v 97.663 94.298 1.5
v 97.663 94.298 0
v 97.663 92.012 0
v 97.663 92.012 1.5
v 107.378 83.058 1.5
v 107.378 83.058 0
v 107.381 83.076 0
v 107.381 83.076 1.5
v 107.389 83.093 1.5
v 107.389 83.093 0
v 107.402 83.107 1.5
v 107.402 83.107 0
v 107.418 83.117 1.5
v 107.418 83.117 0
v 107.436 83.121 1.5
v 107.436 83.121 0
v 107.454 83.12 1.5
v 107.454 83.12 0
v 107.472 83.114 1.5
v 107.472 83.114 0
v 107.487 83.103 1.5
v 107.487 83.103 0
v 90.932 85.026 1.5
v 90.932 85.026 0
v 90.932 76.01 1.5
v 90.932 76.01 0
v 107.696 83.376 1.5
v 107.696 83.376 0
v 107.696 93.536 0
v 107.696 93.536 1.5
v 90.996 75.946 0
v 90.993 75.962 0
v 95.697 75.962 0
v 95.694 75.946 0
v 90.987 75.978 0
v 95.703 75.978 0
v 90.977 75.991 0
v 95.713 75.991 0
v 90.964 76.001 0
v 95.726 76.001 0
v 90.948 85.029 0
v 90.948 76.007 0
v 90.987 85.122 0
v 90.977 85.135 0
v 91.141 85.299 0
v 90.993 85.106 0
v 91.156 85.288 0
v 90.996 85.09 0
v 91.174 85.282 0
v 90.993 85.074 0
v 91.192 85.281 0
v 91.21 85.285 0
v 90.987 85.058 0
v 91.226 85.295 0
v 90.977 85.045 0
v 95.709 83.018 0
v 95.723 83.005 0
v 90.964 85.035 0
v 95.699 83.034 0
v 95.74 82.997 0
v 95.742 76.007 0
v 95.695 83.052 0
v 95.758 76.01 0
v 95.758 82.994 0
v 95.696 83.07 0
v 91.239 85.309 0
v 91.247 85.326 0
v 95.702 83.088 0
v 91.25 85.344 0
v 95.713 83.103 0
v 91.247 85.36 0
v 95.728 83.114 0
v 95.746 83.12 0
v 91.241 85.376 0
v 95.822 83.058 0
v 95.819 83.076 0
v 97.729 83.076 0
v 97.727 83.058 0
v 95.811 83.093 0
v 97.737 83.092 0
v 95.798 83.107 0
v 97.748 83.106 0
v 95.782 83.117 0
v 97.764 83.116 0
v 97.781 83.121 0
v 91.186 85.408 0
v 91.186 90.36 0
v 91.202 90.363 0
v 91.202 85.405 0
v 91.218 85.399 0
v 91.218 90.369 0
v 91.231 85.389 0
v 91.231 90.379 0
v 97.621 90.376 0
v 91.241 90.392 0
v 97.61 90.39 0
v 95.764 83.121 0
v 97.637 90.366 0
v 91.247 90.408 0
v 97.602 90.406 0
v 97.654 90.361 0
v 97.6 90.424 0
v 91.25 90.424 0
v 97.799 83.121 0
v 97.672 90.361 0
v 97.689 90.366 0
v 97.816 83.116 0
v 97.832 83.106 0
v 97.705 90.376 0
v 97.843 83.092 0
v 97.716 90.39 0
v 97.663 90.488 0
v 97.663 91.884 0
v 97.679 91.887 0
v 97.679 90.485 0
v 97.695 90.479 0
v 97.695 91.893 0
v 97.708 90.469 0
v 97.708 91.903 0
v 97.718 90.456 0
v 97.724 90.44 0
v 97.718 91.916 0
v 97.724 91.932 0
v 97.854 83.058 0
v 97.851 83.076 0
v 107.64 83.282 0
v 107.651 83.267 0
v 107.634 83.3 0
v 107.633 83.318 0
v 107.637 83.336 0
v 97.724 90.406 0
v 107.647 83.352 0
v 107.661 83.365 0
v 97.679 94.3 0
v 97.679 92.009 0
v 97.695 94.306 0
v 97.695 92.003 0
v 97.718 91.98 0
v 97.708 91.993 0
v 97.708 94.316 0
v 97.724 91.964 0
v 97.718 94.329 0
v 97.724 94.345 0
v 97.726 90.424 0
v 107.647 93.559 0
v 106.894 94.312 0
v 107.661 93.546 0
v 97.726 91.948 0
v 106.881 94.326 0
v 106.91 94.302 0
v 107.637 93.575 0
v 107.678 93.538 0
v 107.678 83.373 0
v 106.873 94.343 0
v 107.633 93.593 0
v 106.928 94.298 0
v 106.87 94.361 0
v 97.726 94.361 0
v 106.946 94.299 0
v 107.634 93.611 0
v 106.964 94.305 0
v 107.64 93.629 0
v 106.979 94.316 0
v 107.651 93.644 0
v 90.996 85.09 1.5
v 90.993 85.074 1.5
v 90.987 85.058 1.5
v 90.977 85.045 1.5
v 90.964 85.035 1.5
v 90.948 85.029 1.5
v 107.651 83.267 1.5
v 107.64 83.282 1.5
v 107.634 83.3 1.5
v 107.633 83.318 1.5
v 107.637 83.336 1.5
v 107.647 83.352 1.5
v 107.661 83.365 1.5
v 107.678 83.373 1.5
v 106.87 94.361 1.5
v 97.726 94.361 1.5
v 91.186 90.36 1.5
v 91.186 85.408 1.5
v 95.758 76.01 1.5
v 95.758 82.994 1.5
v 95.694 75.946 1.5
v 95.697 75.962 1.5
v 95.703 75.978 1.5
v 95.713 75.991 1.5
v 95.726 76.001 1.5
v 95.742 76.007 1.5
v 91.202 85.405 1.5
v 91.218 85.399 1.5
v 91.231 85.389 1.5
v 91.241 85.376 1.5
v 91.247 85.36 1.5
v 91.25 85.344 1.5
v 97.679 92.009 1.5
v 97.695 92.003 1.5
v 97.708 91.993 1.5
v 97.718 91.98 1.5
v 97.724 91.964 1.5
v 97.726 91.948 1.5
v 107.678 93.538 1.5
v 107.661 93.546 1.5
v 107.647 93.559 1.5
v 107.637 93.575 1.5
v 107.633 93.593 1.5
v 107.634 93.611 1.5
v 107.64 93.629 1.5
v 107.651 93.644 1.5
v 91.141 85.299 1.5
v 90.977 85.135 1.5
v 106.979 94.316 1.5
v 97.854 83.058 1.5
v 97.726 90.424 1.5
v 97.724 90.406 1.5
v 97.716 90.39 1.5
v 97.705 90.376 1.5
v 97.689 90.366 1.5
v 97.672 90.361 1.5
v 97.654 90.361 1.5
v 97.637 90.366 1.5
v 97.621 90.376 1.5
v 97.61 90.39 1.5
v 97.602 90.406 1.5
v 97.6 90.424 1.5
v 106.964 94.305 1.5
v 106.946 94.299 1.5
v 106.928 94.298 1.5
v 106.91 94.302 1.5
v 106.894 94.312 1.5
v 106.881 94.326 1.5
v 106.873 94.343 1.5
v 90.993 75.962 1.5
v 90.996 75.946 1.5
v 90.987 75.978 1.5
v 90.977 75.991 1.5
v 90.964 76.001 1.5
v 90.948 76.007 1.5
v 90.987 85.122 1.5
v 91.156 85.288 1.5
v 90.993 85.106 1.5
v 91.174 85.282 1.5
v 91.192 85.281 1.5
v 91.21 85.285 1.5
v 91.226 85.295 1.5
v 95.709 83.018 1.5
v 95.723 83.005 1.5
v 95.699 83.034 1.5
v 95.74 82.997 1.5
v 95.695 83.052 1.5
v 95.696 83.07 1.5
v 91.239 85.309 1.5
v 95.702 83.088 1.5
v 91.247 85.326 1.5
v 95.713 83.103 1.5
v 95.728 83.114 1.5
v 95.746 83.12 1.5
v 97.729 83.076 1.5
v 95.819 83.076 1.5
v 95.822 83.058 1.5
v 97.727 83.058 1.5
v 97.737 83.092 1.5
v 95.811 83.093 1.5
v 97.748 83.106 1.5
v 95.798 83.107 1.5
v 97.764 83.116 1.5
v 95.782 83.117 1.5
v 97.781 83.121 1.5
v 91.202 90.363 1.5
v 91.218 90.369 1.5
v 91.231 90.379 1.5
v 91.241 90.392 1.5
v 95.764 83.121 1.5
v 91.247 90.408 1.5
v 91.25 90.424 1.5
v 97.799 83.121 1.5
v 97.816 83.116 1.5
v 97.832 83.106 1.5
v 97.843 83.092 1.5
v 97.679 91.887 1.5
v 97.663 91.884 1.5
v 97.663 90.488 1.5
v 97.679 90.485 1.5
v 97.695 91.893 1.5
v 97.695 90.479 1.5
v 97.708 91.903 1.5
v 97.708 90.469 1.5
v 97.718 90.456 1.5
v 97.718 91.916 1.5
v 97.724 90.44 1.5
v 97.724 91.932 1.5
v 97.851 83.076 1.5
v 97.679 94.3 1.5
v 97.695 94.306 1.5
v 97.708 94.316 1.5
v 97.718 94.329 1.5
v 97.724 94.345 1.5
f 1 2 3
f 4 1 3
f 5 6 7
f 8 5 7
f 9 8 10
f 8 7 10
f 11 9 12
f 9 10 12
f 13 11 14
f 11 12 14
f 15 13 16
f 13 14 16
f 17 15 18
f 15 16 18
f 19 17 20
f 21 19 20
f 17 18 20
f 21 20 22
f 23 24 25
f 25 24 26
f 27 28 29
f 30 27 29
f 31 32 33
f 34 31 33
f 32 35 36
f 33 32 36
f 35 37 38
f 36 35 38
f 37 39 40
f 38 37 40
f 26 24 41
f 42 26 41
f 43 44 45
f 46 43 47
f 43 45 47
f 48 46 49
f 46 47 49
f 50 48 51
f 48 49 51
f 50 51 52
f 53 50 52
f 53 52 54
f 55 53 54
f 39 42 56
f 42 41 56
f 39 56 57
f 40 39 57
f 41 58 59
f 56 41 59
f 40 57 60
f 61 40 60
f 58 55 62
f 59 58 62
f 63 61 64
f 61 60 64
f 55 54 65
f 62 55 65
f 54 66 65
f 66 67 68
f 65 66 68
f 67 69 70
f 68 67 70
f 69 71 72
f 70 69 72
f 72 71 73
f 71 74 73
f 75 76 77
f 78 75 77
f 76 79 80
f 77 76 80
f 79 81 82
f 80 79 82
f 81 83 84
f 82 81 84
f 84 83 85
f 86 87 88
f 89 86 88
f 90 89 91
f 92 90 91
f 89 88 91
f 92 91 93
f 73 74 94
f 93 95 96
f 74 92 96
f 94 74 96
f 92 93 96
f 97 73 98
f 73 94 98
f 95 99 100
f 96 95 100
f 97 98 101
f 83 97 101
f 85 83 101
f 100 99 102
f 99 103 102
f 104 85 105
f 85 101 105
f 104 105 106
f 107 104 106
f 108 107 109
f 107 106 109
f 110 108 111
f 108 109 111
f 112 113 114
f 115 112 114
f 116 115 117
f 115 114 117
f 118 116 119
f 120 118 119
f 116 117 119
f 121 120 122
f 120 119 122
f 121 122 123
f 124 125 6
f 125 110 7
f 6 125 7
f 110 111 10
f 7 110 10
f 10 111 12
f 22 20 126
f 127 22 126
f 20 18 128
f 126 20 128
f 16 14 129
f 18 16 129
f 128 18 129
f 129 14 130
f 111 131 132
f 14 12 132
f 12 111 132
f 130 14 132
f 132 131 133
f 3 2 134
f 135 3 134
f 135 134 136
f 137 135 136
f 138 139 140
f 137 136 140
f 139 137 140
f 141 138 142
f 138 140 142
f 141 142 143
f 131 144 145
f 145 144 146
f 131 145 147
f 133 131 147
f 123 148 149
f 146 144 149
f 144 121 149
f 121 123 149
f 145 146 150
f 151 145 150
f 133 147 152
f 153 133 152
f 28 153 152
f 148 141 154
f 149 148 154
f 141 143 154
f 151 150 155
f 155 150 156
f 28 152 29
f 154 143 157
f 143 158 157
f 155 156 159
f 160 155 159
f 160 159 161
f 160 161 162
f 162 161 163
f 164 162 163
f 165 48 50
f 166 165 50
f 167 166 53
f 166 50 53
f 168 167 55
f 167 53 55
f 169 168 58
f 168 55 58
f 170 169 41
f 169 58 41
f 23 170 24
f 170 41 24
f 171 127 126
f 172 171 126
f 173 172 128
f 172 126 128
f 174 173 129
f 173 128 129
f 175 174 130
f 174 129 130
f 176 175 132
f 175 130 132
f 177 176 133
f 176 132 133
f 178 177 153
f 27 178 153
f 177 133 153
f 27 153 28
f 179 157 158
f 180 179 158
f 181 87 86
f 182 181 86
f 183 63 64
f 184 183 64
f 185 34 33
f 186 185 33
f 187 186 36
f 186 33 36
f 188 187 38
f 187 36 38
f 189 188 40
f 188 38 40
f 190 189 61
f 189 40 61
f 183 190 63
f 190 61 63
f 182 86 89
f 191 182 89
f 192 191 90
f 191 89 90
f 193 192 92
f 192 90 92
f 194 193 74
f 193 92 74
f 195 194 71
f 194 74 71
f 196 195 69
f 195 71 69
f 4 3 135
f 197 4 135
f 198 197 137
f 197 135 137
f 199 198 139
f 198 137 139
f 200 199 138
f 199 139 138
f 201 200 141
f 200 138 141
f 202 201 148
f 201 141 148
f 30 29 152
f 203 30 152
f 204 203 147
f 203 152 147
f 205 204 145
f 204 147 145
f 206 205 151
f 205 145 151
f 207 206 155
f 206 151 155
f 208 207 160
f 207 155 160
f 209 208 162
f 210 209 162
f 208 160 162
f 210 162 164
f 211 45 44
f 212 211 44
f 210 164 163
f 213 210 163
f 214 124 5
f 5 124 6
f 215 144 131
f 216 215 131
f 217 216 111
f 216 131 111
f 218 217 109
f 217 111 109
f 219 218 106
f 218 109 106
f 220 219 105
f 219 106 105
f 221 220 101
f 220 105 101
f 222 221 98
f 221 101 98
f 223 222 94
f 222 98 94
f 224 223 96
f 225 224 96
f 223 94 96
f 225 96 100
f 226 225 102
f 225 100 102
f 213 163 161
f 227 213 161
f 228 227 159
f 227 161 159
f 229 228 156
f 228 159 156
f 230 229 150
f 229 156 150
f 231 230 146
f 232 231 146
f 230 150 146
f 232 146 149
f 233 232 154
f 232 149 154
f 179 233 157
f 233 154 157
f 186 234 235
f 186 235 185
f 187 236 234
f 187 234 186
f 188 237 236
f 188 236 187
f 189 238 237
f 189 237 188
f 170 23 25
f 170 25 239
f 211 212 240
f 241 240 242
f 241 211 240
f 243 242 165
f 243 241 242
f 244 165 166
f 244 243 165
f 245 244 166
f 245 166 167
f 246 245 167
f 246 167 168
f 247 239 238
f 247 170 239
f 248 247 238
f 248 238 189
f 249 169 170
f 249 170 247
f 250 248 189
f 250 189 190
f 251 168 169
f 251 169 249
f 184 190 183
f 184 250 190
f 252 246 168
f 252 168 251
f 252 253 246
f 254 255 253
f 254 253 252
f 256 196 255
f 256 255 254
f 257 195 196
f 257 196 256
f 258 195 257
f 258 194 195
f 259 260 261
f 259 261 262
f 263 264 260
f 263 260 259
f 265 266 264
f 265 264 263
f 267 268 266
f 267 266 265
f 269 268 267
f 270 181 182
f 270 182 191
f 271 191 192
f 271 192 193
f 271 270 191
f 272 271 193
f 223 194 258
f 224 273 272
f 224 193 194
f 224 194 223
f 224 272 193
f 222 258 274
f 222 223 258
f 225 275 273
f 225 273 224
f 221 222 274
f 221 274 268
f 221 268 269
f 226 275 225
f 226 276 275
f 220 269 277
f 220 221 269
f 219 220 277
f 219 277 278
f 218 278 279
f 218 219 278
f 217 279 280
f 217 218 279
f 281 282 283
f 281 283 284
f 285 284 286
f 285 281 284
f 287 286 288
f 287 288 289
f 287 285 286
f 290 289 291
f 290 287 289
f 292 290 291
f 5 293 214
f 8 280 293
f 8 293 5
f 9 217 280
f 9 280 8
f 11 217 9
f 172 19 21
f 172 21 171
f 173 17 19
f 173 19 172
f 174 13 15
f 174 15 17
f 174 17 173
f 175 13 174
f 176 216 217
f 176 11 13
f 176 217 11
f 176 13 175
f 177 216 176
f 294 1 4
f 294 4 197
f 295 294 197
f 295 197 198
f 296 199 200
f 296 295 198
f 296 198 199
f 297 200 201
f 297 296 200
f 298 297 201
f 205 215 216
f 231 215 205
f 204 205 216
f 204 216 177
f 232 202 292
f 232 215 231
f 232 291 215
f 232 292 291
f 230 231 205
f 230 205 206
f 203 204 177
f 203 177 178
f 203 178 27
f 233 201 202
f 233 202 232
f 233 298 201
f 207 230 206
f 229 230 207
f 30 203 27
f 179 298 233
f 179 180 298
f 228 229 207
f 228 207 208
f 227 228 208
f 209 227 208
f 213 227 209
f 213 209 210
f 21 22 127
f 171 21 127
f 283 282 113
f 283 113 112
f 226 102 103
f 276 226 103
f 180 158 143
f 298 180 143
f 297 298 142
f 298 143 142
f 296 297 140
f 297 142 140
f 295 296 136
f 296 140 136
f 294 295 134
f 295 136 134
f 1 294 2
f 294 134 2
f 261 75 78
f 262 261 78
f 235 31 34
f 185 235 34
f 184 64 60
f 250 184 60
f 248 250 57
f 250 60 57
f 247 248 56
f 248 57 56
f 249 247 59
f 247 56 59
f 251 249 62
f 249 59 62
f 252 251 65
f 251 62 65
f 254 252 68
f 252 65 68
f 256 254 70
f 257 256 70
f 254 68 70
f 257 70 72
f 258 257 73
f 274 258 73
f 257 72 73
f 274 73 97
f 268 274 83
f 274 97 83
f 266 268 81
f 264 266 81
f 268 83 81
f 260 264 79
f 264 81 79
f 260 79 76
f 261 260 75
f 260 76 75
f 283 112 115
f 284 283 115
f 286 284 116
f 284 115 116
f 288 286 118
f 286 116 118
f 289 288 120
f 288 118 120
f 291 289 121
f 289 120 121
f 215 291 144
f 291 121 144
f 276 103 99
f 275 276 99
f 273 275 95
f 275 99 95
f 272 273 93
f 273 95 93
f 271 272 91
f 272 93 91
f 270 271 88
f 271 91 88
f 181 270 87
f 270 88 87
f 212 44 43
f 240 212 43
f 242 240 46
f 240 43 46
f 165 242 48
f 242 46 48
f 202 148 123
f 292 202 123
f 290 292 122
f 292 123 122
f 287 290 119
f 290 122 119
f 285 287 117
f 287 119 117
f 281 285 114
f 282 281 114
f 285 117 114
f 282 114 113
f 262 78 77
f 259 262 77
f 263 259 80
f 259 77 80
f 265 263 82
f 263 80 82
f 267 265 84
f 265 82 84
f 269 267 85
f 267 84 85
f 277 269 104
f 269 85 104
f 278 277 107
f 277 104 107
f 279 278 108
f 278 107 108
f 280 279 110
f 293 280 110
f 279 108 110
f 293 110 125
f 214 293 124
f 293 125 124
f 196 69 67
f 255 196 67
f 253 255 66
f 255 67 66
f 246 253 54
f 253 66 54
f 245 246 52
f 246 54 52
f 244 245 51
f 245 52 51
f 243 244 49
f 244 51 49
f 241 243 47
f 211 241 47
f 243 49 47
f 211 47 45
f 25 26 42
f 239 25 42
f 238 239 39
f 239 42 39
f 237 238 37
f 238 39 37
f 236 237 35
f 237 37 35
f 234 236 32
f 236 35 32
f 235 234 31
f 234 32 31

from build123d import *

# Parameters (mm, degrees)
EXTRUDE_1_DEPTH = 1.5


with BuildPart() as part:
    # 草图1 → 凸台-拉伸1 (new body)
    with BuildSketch(Plane.XY):
        with BuildLine():
            Line((91.141098719, 85.299098719), (90.976901281, 85.134901281))
            ThreePointArc((90.976901281, 85.134901281), (90.99066635, 85.114300398), (90.9955, 85.09))
            ThreePointArc((90.9955, 85.09), (90.976901281, 85.045098719), (90.932, 85.0265))
            Line((90.932, 85.0265), (90.932, 76.0095))
            ThreePointArc((90.932, 76.0095), (90.976901281, 75.990901281), (90.9955, 75.946))
            Line((90.9955, 75.946), (95.6945, 75.946))
            ThreePointArc((95.6945, 75.946), (95.713098719, 75.990901281), (95.758, 76.0095))
            Line((95.758, 76.0095), (95.758, 82.9945))
            ThreePointArc((95.758, 82.9945), (95.713098719, 83.102901281), (95.8215, 83.058))
            Line((95.8215, 83.058), (97.7265, 83.058))
            ThreePointArc((97.7265, 83.058), (97.79, 83.1215), (97.8535, 83.058))
            Line((97.8535, 83.058), (107.3785, 83.058))
            ThreePointArc((107.3785, 83.058), (107.417699602, 83.11666635), (107.486901281, 83.102901281))
            Line((107.486901281, 83.102901281), (107.651098719, 83.267098719))
            ThreePointArc((107.651098719, 83.267098719), (107.63733365, 83.336300398), (107.696, 83.3755))
            Line((107.696, 83.3755), (107.696, 93.5355))
            ThreePointArc((107.696, 93.5355), (107.63733365, 93.574699602), (107.651098719, 93.643901281))
            Line((107.651098719, 93.643901281), (106.978901281, 94.316098719))
            ThreePointArc((106.978901281, 94.316098719), (106.909699602, 94.30233365), (106.8705, 94.361))
            Line((106.8705, 94.361), (97.7265, 94.361))
            ThreePointArc((97.7265, 94.361), (97.707901281, 94.316098719), (97.663, 94.2975))
            Line((97.663, 94.2975), (97.663, 92.0115))
            ThreePointArc((97.663, 92.0115), (97.707901281, 91.992901281), (97.7265, 91.948))
            ThreePointArc((97.7265, 91.948), (97.707901281, 91.903098719), (97.663, 91.8845))
            Line((97.663, 91.8845), (97.663, 90.4875))
            ThreePointArc((97.663, 90.4875), (97.707901281, 90.468901281), (97.7265, 90.424))
            ThreePointArc((97.7265, 90.424), (97.663, 90.3605), (97.5995, 90.424))
            Line((97.5995, 90.424), (91.2495, 90.424))
            ThreePointArc((91.2495, 90.424), (91.230901281, 90.379098719), (91.186, 90.3605))
            Line((91.186, 90.3605), (91.186, 85.4075))
            ThreePointArc((91.186, 85.4075), (91.230901281, 85.388901281), (91.2495, 85.344))
            ThreePointArc((91.2495, 85.344), (91.210300398, 85.28533365), (91.141098719, 85.299098719))
        make_face()
    extrude(amount=EXTRUDE_1_DEPTH)


solid = part.part
